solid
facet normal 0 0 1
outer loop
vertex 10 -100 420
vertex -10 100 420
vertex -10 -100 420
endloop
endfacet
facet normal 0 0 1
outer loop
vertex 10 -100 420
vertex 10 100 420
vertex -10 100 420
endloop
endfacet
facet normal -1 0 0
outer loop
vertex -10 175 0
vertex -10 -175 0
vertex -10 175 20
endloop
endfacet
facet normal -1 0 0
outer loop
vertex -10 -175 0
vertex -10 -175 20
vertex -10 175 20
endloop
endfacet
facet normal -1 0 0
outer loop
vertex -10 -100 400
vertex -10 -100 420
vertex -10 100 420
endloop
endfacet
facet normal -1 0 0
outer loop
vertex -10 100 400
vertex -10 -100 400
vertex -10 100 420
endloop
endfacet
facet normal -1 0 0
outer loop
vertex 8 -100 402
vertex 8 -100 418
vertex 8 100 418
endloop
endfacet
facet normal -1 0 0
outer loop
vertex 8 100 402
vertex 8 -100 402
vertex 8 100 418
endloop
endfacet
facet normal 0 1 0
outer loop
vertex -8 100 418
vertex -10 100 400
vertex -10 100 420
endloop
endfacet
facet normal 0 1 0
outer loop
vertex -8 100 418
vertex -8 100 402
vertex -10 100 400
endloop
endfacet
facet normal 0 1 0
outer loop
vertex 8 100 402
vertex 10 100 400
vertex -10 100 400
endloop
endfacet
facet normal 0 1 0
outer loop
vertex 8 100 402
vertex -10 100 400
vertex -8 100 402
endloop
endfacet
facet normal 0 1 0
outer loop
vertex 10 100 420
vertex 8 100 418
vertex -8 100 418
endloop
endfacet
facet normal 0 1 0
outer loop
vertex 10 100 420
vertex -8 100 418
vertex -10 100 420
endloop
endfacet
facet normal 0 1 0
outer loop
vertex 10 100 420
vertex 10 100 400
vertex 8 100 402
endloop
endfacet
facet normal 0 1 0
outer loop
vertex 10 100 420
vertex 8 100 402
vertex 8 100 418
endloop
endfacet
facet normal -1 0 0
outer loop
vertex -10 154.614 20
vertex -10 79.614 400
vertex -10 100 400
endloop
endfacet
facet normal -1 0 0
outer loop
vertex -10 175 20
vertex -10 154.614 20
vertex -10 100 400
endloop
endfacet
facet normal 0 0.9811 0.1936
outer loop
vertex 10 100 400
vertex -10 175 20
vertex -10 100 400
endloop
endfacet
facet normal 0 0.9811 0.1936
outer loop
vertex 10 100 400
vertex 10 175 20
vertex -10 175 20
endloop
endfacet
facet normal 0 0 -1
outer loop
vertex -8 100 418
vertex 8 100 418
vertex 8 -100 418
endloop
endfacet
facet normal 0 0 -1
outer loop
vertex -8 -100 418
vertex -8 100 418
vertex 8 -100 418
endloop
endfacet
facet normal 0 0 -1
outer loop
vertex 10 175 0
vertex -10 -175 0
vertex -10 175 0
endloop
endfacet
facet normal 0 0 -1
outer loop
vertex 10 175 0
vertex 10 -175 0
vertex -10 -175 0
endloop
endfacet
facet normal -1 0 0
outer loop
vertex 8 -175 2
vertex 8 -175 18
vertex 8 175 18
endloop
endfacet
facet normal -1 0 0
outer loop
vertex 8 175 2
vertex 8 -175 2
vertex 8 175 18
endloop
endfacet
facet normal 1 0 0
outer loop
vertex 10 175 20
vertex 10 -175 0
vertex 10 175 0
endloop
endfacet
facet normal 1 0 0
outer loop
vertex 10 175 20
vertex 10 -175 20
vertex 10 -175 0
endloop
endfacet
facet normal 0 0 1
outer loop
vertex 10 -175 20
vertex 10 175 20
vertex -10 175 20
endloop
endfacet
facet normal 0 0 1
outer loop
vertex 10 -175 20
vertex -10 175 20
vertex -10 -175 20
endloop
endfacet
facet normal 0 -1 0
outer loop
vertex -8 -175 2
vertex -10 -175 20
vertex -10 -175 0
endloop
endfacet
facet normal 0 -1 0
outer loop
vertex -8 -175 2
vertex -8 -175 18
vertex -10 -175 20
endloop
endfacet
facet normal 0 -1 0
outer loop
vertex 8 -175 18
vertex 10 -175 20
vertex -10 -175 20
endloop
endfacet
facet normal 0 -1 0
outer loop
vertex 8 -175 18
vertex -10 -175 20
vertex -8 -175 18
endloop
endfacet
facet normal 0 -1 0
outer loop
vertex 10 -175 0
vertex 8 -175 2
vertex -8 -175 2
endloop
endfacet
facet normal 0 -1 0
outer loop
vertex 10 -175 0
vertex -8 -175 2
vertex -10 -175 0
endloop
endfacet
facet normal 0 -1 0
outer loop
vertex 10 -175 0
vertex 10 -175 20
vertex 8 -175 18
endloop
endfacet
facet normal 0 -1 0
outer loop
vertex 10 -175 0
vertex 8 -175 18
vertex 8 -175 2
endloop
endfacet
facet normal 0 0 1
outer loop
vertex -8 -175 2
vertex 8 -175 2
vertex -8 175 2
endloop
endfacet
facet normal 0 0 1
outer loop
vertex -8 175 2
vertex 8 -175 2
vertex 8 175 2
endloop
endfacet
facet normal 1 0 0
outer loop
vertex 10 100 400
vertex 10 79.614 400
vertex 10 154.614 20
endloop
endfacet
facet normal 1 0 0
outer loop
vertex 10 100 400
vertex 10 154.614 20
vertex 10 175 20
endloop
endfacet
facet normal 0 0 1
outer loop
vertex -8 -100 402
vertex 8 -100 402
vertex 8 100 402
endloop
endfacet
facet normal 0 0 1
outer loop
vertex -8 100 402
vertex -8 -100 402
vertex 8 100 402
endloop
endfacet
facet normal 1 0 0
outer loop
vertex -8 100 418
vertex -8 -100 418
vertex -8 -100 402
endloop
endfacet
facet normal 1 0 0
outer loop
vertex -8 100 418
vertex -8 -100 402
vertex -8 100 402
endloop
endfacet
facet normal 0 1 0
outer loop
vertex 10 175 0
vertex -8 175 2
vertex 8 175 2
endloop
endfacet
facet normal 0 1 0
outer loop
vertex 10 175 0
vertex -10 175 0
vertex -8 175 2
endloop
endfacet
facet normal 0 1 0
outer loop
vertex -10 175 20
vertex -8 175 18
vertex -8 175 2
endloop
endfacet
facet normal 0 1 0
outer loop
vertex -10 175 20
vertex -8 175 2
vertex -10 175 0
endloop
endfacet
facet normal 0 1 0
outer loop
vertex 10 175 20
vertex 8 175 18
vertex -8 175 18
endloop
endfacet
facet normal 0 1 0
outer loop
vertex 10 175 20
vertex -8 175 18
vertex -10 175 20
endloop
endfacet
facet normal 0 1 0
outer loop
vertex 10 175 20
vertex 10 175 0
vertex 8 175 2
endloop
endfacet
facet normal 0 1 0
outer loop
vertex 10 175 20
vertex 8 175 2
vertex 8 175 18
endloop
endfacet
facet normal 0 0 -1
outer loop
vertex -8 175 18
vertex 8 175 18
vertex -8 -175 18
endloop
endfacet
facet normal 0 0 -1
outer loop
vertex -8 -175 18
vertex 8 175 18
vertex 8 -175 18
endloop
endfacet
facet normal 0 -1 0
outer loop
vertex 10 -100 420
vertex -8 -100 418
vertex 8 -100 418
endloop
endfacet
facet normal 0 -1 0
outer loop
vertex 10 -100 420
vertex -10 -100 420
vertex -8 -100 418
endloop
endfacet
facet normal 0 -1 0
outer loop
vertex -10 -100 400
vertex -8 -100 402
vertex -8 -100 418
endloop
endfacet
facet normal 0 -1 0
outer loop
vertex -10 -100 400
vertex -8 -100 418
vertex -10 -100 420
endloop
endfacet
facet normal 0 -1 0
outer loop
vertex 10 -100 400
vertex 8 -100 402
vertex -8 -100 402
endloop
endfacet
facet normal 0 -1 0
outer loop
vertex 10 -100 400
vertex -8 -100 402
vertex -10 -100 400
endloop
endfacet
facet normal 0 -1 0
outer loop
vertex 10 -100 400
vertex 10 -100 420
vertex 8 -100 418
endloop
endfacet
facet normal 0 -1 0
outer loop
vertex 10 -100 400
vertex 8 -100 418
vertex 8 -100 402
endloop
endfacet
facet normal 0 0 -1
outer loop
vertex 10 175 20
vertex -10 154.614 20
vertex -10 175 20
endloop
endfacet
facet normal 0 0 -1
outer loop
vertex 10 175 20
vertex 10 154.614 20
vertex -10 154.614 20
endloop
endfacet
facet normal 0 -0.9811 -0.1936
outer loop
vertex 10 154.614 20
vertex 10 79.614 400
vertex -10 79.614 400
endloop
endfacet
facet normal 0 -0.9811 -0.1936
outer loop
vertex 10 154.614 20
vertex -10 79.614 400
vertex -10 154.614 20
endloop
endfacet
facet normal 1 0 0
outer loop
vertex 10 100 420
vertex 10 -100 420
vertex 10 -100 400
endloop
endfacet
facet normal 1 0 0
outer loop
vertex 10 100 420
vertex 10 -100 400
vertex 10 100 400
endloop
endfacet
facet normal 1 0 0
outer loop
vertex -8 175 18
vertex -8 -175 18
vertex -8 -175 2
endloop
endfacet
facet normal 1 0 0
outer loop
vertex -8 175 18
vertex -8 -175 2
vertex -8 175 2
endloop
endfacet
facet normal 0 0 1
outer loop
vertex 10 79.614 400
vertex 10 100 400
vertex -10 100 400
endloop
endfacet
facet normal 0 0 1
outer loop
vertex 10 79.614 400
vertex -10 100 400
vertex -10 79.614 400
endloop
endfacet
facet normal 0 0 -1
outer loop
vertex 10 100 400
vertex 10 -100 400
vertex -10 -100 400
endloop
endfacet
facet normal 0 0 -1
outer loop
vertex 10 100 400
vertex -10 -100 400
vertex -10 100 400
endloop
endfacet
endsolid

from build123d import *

# Parameters (mm, degrees)
F1_DEPTH = 10
F2_T     = -2
F2_2_T   = -2
F4_DEPTH = 10


with BuildPart() as f1:
    # F0 (on Right) → F1 (new body, symmetric)
    with BuildSketch(Plane.YZ):
        Polygon((-175, 0), (0, 0), (175, 0), (175, 20), (-175, 20), align=None)
    extrude(amount=F1_DEPTH, both=True)

    # F2#2
    f2_2_openings = [f1.faces().sort_by_distance(p)[0] for p in [
        (0, -175, 10),
        (0, 175, 10),
    ]]
    offset(amount=F2_2_T, openings=f2_2_openings)


with BuildPart() as f1b:
    # F0 (on Right) → F1, piece 2 (new body, symmetric)
    with BuildSketch(Plane.YZ):
        Polygon((100, 420), (0, 420), (-100, 420), (-100, 400), (100, 400), align=None)
    extrude(amount=F1_DEPTH, both=True)

    # F2
    f2_openings = [f1b.faces().sort_by_distance(p)[0] for p in [
        (0, 100, 410),
        (0, -100, 410),
    ]]
    offset(amount=F2_T, openings=f2_openings)


with BuildPart() as f4:
    # F3 (on Right) → F4 (new body, symmetric)
    with BuildSketch(Plane.YZ):
        Polygon((175, 20), (100, 400), (79.6141785191, 400), (154.6141785191, 20), align=None)
    extrude(amount=F4_DEPTH, both=True)


solid = Compound([f1.part, f1b.part, f4.part])
